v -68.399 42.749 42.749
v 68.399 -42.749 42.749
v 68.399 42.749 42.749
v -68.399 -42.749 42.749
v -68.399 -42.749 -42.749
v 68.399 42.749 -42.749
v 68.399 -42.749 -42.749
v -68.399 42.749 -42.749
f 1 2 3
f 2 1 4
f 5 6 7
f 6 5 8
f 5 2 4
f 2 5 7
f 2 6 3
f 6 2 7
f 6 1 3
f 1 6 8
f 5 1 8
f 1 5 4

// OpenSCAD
translate(v=[-68.39903786706786, -42.74939866691741, -42.74939866691741])
  cube(size=[136.79807573413572, 85.49879733383482, 85.49879733383482]);
